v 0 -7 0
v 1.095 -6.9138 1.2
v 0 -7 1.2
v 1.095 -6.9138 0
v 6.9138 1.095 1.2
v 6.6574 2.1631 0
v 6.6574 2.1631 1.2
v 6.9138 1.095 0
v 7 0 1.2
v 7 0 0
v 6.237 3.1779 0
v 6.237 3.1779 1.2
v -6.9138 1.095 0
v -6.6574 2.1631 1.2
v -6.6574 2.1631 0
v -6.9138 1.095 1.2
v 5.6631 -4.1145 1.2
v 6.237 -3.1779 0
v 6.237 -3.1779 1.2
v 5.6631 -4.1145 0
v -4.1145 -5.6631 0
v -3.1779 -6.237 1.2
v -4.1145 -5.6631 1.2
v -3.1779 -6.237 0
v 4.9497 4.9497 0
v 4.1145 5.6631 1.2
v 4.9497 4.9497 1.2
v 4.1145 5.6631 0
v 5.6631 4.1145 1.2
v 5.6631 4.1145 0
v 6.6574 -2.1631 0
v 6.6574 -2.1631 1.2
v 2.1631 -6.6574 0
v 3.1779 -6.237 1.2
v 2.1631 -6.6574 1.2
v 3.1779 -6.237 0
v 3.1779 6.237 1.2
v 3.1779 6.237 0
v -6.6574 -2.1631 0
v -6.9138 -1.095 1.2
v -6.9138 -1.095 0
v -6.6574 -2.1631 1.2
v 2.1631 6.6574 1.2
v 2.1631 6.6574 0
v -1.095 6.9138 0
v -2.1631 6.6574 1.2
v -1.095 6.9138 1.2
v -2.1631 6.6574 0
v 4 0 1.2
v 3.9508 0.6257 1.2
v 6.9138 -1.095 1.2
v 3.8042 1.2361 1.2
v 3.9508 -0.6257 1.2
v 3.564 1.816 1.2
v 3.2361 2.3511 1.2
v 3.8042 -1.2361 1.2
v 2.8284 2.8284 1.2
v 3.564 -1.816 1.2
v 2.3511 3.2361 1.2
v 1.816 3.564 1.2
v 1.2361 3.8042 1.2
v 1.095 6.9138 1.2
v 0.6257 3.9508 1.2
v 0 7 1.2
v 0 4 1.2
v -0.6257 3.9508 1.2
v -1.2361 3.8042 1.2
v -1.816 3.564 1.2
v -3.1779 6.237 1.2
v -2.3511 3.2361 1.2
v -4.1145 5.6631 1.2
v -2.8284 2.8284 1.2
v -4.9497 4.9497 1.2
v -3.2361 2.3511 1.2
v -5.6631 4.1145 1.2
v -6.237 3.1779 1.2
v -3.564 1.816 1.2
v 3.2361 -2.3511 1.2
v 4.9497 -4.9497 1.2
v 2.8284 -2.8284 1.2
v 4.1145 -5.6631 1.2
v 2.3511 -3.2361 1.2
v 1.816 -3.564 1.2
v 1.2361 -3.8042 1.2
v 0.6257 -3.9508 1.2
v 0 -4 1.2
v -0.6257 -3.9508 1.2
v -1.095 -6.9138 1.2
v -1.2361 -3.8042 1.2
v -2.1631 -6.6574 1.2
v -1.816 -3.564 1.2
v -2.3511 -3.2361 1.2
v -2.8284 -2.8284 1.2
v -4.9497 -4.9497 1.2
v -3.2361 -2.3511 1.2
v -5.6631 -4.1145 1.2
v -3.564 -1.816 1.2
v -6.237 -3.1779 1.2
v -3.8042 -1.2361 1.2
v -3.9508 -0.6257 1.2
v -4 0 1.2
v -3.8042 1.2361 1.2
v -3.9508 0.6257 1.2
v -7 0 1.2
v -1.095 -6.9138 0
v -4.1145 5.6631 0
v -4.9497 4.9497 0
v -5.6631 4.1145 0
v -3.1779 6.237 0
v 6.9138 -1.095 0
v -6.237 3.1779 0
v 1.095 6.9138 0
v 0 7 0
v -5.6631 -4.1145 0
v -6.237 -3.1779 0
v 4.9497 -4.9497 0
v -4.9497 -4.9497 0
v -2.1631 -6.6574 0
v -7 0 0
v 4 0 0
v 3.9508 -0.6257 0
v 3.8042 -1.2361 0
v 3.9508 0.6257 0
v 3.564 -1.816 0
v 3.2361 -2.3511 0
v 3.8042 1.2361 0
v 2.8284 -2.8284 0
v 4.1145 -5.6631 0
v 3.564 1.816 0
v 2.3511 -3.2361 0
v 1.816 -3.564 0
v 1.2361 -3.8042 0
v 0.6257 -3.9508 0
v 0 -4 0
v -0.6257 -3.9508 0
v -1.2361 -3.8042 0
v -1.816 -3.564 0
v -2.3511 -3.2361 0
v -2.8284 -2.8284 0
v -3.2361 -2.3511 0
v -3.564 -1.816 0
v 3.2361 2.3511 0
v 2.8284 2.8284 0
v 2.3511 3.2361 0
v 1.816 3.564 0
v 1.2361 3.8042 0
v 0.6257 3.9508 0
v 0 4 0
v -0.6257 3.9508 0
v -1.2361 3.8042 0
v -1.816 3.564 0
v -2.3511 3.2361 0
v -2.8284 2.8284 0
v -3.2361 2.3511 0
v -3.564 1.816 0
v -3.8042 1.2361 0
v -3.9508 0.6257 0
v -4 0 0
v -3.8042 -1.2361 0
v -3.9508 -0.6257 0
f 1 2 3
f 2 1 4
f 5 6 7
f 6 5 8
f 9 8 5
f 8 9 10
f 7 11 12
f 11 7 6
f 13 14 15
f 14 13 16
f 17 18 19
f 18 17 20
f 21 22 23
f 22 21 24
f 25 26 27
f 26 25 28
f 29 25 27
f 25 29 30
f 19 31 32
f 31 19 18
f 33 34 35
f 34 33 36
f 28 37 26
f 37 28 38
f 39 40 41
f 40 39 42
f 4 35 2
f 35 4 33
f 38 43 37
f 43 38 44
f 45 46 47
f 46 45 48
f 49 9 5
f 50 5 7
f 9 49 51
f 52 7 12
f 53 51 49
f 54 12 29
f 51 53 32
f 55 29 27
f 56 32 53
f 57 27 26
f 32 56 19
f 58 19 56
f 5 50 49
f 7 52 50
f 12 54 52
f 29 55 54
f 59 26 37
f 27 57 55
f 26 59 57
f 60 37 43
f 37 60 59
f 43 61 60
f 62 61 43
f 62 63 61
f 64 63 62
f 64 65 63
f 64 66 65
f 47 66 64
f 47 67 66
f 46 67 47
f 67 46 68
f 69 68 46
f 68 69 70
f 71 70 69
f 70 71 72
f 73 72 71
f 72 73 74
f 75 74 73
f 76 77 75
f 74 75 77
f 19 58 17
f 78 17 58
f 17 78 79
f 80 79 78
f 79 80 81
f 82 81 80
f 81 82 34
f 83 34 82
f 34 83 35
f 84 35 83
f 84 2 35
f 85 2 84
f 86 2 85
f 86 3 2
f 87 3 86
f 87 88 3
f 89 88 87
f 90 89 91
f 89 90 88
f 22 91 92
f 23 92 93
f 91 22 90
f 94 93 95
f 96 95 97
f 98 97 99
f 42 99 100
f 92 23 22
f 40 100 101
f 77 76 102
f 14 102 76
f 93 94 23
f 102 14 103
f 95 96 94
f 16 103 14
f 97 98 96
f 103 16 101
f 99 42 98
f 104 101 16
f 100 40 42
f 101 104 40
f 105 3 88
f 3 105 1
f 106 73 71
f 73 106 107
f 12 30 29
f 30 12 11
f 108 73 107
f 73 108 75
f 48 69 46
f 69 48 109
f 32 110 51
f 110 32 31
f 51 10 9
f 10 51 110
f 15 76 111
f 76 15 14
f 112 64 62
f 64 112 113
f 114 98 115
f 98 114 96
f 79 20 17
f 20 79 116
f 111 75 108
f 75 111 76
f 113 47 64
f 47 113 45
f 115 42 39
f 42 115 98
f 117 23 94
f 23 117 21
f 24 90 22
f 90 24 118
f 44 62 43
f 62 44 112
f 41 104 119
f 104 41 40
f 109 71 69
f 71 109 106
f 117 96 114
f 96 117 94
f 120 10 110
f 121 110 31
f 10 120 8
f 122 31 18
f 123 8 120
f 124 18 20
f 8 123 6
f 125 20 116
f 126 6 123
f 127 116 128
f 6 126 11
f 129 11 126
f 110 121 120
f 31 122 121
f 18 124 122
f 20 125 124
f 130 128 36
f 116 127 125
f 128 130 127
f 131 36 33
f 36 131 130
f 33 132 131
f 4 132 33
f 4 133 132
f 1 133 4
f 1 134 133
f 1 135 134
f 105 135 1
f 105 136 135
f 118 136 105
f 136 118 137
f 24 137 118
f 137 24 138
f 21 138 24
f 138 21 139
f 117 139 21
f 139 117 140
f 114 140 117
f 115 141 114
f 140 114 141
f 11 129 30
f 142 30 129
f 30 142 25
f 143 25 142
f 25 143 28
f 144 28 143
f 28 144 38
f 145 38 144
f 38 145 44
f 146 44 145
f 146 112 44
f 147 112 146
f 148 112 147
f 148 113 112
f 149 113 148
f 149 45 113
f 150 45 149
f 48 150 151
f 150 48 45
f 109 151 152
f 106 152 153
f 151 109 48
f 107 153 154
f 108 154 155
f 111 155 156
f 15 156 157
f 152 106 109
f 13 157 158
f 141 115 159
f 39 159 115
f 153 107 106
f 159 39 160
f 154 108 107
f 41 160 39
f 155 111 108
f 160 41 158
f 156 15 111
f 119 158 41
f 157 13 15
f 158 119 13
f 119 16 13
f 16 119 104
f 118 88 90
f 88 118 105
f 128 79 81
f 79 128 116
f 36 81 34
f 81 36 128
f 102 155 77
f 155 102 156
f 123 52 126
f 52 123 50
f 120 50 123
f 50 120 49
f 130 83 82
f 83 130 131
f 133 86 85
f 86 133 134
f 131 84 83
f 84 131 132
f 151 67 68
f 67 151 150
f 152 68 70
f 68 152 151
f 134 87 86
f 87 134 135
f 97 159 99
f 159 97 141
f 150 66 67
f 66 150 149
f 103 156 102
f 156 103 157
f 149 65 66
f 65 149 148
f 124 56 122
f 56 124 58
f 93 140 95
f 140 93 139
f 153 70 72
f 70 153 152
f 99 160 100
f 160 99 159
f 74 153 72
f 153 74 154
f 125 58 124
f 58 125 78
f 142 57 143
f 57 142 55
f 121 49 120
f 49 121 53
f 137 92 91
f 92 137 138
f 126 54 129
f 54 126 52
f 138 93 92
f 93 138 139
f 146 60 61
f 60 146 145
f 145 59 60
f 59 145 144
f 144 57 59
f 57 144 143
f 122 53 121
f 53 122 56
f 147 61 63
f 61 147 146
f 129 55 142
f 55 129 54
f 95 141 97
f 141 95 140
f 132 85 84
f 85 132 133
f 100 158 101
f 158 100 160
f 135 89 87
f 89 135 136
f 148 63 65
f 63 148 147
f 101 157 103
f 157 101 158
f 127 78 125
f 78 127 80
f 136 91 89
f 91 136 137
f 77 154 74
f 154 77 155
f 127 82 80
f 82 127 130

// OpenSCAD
/*
PODKŁADKA DIN 988

*/

$fn = 40;


        
DIN988(8);
module DIN988(gwint)
{
    //Parametry
        //
        function d1(gwint) = lookup(gwint, [[3,3],[4,4],[5,5],[6,6],[7,7],[8,8],[9,9],[10,10],[11,11],[12,12],[13,13],[14,14],[15,15],[16,16],[18,18],[20,20]]);
        d1=d1(gwint);
        //
        function h(gwint) = lookup(gwint, [[3,1.2],[4,1.2],[5,1.2],[6,1.2],[7,1.2],[8,1.2],[9,1.2],[10,1.2],[11,1.2],[12,1.2],[13,1.2],[14,2],[15,2],[16,2],[18,2],[20,2]]);
        h=h(gwint);
        //
        function d2(gwint) = lookup(gwint, [[3,6],[4,8],[5,10],[6,12],[7,13],[8,14],[10,16],[11,17],[12,18],[13,19],[14,20],[15,21],[16,22],[18,25],[20,28]]);
        d2=d2(gwint);
    
    steel = [0.8, 0.8, 0.9];
    color(steel,1)
    difference()
    {
    cylinder(h=h, d=d2, center=false);
    translate([0,0,-1])
    cylinder(h=h+2, d=d1, center=false);
    }
}
